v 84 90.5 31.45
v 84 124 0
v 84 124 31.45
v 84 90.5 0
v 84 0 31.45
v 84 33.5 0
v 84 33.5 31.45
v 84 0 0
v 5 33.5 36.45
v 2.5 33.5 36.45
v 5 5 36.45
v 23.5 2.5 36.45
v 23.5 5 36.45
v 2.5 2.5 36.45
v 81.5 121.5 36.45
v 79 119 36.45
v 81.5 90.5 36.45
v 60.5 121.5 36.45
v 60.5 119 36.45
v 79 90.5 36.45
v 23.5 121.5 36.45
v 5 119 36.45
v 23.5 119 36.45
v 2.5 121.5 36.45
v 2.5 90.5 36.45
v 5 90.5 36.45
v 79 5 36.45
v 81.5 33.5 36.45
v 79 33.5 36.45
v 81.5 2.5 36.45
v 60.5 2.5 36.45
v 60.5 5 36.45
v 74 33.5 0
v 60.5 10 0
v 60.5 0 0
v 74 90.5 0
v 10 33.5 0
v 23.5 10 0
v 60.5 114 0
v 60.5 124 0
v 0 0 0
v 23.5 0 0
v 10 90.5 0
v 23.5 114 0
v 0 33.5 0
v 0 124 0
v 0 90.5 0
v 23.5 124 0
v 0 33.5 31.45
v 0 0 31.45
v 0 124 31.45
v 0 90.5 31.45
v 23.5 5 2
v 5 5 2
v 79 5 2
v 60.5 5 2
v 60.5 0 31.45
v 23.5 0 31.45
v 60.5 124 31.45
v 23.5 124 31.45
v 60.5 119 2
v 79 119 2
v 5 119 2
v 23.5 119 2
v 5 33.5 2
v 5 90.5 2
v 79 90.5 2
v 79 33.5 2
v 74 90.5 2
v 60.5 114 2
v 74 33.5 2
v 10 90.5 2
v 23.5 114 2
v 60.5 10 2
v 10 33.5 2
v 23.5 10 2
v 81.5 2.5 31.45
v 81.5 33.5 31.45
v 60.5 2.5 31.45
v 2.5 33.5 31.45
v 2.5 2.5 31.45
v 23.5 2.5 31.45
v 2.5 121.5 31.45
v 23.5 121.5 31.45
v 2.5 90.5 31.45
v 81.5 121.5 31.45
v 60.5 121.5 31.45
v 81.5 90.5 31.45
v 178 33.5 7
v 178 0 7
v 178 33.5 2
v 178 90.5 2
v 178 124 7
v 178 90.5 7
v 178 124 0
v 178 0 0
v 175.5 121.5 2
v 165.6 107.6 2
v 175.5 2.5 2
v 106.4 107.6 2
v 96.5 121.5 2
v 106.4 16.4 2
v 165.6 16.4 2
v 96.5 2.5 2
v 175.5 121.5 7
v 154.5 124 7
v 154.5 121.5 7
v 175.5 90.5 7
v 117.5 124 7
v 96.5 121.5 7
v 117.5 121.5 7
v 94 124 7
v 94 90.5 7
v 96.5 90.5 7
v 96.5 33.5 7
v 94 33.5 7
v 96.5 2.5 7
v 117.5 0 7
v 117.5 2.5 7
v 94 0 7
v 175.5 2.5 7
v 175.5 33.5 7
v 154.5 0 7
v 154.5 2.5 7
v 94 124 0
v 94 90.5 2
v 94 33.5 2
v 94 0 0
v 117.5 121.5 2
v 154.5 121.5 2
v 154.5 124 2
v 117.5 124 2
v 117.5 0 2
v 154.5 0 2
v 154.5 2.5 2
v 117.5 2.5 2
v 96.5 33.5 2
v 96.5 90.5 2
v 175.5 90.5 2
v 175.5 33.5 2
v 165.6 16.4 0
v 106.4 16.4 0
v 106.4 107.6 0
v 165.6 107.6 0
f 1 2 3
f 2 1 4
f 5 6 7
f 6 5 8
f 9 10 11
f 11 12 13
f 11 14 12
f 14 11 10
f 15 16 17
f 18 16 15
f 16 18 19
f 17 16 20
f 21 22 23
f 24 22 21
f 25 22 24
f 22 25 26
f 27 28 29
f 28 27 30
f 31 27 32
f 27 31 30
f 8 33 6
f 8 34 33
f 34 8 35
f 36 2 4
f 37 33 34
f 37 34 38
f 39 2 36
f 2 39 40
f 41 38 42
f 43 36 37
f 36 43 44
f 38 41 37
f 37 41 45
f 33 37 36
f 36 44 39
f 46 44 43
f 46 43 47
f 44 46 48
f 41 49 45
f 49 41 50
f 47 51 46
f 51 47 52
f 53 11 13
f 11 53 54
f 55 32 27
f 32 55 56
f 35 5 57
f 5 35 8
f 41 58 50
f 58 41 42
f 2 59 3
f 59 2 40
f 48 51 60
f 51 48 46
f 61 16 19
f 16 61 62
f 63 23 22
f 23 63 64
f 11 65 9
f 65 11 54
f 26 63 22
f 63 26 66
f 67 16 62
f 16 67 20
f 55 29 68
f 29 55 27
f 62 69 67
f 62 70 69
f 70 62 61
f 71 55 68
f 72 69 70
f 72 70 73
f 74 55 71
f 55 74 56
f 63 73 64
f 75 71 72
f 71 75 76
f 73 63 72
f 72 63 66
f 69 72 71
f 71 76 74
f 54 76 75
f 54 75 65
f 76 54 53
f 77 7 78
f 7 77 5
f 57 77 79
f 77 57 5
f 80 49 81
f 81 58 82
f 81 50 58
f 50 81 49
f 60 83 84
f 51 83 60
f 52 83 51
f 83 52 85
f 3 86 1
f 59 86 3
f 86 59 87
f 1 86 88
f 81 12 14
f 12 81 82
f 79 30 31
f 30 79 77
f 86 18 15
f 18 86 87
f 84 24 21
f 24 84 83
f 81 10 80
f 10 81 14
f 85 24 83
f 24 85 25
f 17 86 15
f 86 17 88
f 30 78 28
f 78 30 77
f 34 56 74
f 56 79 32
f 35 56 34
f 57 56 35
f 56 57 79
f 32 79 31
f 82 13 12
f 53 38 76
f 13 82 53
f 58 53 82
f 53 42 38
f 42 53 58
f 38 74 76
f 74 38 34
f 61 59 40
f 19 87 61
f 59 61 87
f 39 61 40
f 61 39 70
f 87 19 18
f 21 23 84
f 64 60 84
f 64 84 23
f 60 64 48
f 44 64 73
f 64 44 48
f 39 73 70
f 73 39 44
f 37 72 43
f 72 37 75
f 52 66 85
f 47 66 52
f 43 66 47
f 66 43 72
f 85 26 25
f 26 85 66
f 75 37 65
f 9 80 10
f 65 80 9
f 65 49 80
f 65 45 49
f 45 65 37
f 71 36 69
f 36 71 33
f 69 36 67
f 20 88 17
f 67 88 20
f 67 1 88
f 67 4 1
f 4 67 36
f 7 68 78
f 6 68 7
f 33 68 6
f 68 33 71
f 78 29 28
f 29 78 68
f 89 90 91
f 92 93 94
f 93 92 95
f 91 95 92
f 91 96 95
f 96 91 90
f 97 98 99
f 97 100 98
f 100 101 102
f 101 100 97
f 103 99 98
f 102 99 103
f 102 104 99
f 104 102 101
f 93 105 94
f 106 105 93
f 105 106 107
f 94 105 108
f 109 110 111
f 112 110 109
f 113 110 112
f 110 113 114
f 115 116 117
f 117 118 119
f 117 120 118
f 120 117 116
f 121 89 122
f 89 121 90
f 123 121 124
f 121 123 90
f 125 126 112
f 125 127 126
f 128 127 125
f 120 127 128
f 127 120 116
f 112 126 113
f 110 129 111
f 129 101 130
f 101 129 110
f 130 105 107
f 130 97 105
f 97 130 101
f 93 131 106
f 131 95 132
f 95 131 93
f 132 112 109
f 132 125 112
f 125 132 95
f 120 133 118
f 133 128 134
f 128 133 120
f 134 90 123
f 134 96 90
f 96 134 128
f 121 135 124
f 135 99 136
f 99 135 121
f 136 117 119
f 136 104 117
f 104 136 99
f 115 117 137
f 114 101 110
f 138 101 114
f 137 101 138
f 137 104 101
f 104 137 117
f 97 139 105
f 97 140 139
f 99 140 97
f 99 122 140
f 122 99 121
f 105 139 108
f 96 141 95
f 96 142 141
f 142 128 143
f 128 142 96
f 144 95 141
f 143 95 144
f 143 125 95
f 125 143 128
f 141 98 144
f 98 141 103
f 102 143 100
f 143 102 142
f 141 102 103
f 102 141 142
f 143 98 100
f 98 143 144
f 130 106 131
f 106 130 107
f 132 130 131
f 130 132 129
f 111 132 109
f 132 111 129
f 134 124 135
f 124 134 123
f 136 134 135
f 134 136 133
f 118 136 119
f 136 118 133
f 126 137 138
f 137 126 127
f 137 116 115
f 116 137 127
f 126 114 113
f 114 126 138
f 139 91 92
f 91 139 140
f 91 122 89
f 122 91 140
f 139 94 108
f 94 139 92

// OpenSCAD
// The part to print
part = "all"; // [tray,lid,all]

// The width of the card (or width of sleeve)
cardWidth = 72;

// The length of the card (or length of sleeve)
cardLength = 112;

// The height of the card
cardHeight = 0.55;

// The amount of cards
cardCount = 59;

// Extra size for the cards
cardSpacing = 2;

// Extra box height, to ensure cards do not fall out
extraHeight = 4;

// The height of the base and lid
baseHeight = 2;

// The thickness of the walls. The thinnest wall will be half this size.
wallThickness = 5;

// The height of the lid intersection with the base.
lidLegHeight = 5;

contentWidth = cardWidth + cardSpacing;
contentLength = cardLength + cardSpacing;
boxWidth = contentWidth + wallThickness * 2;
boxLength = contentLength + wallThickness * 2;
boxHeight = cardHeight * cardCount + extraHeight;
lidLegThickness = wallThickness / 2;
cardAccessCutoutWidth = contentWidth / 2;
cardAccessCutoutLength = contentLength / 2;
lookingGlassWidth = contentWidth * 0.8;
lookingGlassLength = contentLength * 0.8;

module base() {
	cube([contentWidth + wallThickness * 2, contentLength + wallThickness * 2, baseHeight]);
}

module walls() {
	union() {
		// Top
		cube([contentWidth + wallThickness * 2, wallThickness, boxHeight]);

		// Bottom
		translate([0, contentLength + wallThickness, 0]){
			cube([contentWidth + wallThickness * 2, wallThickness, boxHeight]);
		}

		// Left
		cube([wallThickness, contentLength + wallThickness * 2, boxHeight]);

		// Right
		translate([contentWidth + wallThickness, 0, 0]){
			cube([wallThickness, contentLength + wallThickness * 2, boxHeight]);
		}
	}
}

module lid() {
	translate([0, 0, boxHeight]) {
		difference() {
			union() {
				cube([contentWidth + wallThickness * 2, contentLength + wallThickness * 2, baseHeight]);

				translate([0, 0, -lidLegHeight]) {
					union() {
						// Top
						cube([contentWidth + wallThickness * 2, lidLegThickness, lidLegHeight]);

						// Bottom
						translate([0, contentLength + wallThickness * 2 - lidLegThickness, 0]){
							cube([contentWidth + wallThickness * 2, lidLegThickness, lidLegHeight]);
						}

						// Left
						cube([lidLegThickness, contentLength + wallThickness * 2, lidLegHeight]);

						// Right
						translate([contentWidth + wallThickness * 2 - lidLegThickness, 0, 0]){
							cube([lidLegThickness, contentLength + wallThickness * 2, lidLegHeight]);
						}
					}
				}
			}

			//Looking glass cutout
			translate([boxWidth / 2 - lookingGlassWidth / 2, boxLength / 2 - lookingGlassLength / 2, 0]) {
				cube([lookingGlassWidth, lookingGlassLength, baseHeight]);
			}
		}
	}
}

module cardAccessCutout() {
	cardAccessCutoutCutoutWidth = wallThickness * 2;

	union() {
		//Center on the x axis
		translate([boxWidth / 2 - cardAccessCutoutWidth / 2, 0, 0]) {
			// Top
			cube([cardAccessCutoutWidth, cardAccessCutoutCutoutWidth, boxHeight]);

			// Bottom
			translate([0, boxLength - cardAccessCutoutCutoutWidth, 0]) {
				cube([cardAccessCutoutWidth, cardAccessCutoutCutoutWidth, boxHeight]);
			}
		}

		//Center on the y axis
		translate([0, boxLength / 2 - cardAccessCutoutLength / 2, 0]) {
			// Left
			cube([cardAccessCutoutCutoutWidth, cardAccessCutoutLength, boxHeight]);

			// Right
			translate([boxWidth - cardAccessCutoutCutoutWidth, 0, 0]) {
				cube([cardAccessCutoutCutoutWidth, cardAccessCutoutLength, boxHeight]);
			}
		}
	}
}

if(part == "tray" || part == "all") {
	difference() {
		union() {
			base();
			walls();
		}
		lid();
		cardAccessCutout();
	}
}

if(part == "lid" || part == "all") {
	translate([boxWidth + 10, boxLength, boxHeight + baseHeight]) {
		rotate([180, 0, 0]) {
			difference() {
				lid();
				cardAccessCutout();
			}
		}
	}
}
